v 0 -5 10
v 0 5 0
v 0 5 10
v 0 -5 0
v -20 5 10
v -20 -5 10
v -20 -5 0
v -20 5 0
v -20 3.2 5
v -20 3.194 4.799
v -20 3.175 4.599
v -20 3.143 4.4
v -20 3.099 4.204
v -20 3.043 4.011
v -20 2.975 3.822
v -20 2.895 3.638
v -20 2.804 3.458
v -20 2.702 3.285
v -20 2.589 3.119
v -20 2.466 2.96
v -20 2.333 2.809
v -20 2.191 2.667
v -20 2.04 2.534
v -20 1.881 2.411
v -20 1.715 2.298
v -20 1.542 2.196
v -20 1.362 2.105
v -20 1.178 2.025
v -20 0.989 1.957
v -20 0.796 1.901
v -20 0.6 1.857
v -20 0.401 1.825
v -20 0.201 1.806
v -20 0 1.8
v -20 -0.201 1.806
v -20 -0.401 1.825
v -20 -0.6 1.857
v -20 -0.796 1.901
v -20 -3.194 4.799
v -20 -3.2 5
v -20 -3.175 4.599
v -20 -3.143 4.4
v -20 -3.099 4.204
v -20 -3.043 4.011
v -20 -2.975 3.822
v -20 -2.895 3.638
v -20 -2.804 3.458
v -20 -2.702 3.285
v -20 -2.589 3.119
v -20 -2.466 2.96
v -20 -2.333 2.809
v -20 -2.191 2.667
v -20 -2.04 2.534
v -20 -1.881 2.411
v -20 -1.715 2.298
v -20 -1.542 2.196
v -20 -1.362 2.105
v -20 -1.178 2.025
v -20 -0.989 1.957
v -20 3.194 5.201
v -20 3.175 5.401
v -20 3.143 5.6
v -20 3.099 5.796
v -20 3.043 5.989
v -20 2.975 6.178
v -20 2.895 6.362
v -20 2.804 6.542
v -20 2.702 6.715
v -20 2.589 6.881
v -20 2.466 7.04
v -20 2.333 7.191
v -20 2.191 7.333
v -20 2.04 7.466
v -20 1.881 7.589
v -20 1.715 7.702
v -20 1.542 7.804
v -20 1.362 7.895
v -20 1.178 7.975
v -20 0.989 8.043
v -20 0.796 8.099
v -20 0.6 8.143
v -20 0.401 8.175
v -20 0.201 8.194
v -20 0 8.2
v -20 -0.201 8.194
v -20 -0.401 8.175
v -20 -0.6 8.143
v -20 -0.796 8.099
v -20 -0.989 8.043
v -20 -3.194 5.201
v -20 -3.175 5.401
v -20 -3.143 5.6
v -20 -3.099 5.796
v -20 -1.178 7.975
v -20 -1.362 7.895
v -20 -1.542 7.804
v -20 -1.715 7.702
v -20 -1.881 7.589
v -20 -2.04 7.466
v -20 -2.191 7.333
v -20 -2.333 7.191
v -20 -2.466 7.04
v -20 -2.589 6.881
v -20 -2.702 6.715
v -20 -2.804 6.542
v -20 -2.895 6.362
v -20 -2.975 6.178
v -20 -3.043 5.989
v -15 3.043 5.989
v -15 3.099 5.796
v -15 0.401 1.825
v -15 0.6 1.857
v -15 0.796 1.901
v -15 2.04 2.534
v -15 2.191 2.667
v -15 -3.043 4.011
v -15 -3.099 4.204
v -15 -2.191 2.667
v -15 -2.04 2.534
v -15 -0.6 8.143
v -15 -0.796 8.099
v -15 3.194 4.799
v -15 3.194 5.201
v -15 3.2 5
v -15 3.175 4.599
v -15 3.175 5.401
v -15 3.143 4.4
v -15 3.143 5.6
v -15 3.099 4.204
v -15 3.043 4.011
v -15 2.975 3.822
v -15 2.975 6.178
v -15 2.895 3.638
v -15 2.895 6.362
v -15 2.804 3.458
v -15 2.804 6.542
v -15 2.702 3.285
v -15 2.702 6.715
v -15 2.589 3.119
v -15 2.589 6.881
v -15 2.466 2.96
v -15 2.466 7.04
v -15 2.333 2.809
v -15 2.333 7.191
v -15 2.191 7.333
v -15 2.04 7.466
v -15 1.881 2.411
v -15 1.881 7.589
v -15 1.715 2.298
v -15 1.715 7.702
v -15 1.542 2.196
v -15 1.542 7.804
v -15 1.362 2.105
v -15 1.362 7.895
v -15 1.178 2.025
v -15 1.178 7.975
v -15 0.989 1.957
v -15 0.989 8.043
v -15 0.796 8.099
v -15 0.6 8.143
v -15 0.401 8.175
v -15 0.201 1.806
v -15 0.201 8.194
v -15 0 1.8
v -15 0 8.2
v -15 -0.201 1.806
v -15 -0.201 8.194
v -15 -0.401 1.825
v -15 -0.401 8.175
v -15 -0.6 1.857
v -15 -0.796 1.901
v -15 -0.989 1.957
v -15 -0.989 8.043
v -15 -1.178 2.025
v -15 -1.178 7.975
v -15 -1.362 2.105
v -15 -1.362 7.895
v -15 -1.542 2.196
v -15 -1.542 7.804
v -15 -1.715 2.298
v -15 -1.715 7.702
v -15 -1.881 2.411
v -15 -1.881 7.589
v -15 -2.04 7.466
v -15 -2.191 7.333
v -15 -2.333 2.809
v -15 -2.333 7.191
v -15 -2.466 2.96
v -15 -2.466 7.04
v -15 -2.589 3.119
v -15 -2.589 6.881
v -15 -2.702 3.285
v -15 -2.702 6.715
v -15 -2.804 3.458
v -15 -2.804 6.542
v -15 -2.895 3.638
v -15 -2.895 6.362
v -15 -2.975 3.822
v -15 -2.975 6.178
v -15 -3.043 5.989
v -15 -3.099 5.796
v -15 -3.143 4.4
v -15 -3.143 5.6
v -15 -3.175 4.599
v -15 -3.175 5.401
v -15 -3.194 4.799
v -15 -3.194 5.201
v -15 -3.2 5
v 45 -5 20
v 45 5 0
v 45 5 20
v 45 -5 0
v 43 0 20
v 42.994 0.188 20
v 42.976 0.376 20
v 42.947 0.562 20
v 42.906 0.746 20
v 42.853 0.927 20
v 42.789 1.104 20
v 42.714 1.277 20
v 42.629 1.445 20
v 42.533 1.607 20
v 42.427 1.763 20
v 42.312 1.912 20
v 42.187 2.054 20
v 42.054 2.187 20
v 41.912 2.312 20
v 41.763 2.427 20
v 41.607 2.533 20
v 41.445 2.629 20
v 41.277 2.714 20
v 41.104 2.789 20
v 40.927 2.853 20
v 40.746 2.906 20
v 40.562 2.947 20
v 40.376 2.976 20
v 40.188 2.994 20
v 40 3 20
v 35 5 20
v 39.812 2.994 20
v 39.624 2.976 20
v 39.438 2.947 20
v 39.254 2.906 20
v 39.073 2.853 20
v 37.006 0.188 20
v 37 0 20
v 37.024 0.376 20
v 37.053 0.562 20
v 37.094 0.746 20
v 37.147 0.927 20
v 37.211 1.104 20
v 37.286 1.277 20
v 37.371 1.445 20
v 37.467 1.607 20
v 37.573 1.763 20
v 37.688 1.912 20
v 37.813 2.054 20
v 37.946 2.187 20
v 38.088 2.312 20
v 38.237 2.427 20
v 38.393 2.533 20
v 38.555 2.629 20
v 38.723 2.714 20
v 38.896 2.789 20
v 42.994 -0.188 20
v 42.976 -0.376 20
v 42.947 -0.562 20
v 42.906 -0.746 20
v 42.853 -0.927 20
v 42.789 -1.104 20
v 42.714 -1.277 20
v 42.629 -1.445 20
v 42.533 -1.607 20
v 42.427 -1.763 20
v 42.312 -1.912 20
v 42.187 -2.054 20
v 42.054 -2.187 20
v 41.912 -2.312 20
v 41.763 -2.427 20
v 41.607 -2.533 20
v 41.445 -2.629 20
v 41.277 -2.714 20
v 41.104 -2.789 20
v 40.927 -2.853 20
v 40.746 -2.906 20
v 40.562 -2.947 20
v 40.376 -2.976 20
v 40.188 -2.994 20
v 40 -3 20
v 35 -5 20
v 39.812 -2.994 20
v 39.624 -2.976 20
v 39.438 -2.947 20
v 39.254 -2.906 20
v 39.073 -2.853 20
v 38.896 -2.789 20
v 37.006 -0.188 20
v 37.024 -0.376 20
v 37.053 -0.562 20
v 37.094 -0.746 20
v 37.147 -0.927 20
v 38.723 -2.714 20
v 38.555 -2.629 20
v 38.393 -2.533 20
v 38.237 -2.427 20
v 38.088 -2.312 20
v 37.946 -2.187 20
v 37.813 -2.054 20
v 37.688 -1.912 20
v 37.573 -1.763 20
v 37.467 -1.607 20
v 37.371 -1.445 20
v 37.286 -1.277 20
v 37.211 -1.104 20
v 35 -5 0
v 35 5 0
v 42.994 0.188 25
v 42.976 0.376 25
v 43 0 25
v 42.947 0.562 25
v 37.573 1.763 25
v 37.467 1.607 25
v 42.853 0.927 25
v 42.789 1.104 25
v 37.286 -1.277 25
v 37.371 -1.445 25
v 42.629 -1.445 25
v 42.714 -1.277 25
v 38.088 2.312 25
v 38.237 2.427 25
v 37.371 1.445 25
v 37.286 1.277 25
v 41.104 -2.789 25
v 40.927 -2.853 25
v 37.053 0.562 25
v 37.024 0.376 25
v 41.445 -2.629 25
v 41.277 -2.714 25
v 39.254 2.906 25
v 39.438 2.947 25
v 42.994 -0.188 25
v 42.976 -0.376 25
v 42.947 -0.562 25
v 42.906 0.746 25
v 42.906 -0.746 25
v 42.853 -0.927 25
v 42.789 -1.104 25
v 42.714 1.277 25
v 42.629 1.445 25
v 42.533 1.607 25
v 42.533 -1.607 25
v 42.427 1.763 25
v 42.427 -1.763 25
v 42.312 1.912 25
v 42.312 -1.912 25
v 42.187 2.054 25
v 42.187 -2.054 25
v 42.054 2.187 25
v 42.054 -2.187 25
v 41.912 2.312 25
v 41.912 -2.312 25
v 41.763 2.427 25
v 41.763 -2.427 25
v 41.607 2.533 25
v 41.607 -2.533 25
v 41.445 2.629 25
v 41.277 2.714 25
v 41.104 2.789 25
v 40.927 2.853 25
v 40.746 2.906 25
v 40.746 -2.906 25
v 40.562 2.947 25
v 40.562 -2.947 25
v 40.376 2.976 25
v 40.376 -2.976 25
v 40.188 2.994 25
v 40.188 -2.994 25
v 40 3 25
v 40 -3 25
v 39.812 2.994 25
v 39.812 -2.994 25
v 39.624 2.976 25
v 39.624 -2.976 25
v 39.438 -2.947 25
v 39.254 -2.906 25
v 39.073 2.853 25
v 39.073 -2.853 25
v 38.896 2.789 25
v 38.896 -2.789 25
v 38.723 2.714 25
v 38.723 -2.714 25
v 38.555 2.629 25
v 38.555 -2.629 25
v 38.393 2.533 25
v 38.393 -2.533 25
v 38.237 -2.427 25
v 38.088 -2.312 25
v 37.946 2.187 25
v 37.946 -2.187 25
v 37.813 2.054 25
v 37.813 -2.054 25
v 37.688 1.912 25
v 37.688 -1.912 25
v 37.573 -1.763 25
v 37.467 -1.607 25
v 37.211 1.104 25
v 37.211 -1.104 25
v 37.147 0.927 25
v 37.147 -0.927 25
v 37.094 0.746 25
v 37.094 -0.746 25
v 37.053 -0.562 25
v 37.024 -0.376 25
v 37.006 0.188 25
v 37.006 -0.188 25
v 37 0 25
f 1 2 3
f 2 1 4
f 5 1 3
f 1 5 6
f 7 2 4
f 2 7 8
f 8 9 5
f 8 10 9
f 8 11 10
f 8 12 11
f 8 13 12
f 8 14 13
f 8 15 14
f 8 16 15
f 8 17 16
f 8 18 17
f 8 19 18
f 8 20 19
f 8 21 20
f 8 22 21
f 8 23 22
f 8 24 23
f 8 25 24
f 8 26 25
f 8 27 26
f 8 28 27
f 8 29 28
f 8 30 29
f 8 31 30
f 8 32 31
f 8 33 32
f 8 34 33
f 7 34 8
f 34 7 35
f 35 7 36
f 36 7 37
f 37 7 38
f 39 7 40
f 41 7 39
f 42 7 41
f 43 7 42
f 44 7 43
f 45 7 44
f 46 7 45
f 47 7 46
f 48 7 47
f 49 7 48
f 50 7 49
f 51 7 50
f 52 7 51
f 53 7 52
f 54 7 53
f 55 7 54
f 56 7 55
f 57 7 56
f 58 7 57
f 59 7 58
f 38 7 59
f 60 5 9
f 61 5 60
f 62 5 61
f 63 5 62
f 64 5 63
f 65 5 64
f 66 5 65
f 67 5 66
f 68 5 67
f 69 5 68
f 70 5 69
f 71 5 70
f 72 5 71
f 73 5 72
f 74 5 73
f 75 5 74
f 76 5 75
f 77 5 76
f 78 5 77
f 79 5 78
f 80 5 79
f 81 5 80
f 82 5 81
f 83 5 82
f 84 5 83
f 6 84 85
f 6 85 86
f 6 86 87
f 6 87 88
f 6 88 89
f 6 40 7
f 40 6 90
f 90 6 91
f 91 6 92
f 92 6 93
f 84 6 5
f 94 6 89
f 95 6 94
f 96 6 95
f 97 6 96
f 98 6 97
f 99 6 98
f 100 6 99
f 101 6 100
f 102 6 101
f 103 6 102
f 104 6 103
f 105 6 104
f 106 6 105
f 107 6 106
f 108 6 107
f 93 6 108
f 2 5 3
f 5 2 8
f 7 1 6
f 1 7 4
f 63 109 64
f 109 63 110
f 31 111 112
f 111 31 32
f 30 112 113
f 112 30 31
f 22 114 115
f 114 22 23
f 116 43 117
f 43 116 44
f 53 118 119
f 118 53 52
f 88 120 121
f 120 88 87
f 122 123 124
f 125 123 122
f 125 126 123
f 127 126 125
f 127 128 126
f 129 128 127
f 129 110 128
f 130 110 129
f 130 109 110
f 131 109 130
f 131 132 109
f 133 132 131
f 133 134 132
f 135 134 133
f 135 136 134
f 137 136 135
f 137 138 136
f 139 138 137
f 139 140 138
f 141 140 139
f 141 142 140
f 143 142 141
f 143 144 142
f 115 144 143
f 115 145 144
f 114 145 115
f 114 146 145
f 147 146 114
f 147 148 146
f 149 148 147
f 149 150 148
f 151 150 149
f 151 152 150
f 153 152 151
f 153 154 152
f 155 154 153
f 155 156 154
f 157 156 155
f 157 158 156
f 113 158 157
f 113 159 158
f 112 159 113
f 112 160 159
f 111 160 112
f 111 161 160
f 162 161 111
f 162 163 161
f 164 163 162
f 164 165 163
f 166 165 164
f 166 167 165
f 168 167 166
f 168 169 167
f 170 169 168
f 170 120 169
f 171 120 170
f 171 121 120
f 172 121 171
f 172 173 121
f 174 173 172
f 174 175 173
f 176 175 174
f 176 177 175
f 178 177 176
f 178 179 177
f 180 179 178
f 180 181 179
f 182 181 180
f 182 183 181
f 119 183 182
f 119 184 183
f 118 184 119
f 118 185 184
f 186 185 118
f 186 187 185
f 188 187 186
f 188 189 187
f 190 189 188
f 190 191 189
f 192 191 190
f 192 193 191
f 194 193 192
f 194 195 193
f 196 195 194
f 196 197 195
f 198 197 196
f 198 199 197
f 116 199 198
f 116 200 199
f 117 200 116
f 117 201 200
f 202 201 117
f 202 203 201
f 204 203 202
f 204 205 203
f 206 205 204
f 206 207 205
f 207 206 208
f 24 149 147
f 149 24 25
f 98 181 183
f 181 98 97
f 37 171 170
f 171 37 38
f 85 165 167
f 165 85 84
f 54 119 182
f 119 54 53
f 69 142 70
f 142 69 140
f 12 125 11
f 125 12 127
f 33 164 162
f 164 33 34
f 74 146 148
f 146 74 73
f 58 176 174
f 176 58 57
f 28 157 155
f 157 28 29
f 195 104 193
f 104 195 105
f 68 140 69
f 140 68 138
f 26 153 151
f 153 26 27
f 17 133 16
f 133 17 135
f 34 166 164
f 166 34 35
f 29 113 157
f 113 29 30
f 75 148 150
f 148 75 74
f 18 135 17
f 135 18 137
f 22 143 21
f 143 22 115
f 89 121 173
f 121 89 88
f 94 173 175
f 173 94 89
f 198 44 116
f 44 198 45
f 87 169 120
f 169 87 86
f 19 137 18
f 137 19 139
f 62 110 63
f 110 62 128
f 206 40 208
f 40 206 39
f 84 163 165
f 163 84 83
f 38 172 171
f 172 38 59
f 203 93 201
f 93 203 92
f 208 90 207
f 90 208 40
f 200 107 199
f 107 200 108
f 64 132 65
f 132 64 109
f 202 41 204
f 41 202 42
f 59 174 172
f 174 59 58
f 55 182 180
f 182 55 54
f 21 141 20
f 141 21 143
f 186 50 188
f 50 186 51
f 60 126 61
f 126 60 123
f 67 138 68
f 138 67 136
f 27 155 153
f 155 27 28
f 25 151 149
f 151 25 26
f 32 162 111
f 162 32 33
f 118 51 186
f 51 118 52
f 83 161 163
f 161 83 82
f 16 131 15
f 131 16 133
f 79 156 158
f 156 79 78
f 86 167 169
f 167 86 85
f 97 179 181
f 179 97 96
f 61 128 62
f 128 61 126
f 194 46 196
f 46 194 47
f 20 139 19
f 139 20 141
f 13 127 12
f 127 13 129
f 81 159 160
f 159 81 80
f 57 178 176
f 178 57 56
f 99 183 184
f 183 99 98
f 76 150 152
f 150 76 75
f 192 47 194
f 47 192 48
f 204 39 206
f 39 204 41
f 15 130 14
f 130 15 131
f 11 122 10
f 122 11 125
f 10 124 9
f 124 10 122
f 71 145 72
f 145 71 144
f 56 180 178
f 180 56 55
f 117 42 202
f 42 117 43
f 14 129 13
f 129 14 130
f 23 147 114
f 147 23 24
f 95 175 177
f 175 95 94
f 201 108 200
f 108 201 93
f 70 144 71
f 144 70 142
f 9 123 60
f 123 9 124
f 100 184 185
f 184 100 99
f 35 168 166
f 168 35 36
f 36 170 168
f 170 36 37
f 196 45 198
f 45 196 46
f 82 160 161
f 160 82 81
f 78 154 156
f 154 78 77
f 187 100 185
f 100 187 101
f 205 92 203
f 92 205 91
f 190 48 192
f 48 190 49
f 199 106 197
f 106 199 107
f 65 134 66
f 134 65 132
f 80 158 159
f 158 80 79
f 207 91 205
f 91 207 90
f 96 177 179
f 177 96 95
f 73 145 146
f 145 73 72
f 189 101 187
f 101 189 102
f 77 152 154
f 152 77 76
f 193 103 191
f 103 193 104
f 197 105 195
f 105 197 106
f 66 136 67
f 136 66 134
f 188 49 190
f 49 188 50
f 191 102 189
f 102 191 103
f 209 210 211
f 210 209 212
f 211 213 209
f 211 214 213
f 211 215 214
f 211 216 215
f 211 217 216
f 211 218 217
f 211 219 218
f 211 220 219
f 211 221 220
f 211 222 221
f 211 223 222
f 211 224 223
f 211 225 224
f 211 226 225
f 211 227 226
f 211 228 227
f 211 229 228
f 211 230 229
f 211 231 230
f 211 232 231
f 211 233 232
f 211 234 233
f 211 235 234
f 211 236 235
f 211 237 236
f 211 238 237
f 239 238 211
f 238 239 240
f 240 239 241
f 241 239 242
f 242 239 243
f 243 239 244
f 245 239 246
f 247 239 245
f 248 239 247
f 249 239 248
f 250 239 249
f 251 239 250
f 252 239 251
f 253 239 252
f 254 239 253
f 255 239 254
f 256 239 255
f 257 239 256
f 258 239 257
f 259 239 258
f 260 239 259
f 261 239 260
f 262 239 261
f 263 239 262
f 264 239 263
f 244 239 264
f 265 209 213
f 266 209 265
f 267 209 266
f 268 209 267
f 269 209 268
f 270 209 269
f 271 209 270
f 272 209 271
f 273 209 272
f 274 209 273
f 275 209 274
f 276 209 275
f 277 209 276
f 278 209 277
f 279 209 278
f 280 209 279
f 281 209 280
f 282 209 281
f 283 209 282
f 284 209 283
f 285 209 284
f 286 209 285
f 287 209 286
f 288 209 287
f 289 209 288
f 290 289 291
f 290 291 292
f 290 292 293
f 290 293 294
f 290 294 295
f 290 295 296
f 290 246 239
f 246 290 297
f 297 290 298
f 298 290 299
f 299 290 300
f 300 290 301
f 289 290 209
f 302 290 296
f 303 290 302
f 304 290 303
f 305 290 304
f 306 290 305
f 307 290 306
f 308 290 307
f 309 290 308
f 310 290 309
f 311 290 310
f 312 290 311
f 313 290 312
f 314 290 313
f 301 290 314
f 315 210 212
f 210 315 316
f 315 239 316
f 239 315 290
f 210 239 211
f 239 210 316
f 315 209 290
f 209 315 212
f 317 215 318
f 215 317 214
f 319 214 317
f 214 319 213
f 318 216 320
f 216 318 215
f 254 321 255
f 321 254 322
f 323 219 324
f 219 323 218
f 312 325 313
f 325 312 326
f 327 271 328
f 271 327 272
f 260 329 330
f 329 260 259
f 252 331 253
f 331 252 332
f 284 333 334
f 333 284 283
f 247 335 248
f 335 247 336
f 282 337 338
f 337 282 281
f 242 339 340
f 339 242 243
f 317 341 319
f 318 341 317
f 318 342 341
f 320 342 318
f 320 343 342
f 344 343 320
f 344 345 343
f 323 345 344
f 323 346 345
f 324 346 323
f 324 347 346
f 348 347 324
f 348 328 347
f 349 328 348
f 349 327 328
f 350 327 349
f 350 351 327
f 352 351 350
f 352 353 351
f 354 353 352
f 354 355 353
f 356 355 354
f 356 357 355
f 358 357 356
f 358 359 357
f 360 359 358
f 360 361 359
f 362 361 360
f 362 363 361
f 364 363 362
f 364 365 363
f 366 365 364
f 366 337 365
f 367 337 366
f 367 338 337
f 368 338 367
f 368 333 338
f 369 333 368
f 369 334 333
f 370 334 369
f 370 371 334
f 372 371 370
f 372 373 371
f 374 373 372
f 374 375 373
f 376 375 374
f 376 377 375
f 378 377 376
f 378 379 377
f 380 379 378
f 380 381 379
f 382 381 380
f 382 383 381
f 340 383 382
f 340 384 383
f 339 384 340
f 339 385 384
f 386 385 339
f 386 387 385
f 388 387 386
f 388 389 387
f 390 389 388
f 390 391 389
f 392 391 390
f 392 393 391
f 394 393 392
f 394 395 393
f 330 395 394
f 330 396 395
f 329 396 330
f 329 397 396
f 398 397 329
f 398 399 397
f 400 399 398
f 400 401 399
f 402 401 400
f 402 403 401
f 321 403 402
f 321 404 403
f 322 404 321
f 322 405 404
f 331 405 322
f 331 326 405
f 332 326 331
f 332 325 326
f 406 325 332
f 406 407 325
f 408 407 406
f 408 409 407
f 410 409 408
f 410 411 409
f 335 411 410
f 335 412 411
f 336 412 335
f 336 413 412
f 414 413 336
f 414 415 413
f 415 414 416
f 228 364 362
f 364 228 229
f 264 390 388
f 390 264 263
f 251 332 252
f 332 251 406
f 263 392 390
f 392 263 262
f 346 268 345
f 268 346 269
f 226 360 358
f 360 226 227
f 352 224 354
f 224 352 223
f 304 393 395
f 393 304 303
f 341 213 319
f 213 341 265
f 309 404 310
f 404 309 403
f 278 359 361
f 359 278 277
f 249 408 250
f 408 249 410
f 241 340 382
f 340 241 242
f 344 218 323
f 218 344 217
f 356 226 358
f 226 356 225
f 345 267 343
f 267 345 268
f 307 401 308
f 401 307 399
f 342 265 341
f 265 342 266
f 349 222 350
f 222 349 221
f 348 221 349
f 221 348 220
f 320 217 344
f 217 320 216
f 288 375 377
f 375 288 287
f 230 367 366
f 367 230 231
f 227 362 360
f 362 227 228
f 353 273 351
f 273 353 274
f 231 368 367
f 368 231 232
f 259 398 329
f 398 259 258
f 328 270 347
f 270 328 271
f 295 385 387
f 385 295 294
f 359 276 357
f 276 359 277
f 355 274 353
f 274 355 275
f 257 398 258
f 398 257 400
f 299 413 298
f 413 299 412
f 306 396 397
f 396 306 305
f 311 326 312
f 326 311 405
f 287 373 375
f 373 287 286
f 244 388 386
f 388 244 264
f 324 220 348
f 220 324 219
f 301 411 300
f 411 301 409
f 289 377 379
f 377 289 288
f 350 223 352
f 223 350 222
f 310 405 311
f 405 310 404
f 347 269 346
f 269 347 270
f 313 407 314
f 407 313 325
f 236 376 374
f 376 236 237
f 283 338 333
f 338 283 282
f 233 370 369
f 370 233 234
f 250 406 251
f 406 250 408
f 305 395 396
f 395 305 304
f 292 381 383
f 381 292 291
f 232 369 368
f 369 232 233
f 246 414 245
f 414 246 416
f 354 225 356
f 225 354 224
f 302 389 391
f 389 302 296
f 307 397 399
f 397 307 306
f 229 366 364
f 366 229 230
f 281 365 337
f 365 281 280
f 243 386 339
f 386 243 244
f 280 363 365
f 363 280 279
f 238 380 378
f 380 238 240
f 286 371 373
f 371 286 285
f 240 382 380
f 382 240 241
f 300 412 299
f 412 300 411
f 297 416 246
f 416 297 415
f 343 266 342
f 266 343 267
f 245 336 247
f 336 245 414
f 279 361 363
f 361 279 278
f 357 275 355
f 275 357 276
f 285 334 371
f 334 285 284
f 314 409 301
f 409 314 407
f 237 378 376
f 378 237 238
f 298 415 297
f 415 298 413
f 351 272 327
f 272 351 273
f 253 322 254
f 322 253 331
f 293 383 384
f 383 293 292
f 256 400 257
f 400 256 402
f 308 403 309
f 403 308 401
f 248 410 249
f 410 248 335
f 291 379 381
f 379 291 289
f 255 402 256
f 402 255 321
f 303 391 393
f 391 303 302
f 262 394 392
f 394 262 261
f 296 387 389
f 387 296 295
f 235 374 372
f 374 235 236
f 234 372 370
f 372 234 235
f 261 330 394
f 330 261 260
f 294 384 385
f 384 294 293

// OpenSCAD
translate(v=[40, 0, 10]) 
cube(size=[10, 10, 20], center=true);

translate(v=[40, 0, 20])
cylinder(h=5, r=3, $fn=100);


difference() {
    translate(v=[-10,0,5])
    cube(size=[20, 10, 10], center=true); 
    translate(v=[-17.5, 0, 5])
    rotate(a=[0, 90, 0])
    cylinder(h=5, r=3.2, $fn=100, center=true);
}
